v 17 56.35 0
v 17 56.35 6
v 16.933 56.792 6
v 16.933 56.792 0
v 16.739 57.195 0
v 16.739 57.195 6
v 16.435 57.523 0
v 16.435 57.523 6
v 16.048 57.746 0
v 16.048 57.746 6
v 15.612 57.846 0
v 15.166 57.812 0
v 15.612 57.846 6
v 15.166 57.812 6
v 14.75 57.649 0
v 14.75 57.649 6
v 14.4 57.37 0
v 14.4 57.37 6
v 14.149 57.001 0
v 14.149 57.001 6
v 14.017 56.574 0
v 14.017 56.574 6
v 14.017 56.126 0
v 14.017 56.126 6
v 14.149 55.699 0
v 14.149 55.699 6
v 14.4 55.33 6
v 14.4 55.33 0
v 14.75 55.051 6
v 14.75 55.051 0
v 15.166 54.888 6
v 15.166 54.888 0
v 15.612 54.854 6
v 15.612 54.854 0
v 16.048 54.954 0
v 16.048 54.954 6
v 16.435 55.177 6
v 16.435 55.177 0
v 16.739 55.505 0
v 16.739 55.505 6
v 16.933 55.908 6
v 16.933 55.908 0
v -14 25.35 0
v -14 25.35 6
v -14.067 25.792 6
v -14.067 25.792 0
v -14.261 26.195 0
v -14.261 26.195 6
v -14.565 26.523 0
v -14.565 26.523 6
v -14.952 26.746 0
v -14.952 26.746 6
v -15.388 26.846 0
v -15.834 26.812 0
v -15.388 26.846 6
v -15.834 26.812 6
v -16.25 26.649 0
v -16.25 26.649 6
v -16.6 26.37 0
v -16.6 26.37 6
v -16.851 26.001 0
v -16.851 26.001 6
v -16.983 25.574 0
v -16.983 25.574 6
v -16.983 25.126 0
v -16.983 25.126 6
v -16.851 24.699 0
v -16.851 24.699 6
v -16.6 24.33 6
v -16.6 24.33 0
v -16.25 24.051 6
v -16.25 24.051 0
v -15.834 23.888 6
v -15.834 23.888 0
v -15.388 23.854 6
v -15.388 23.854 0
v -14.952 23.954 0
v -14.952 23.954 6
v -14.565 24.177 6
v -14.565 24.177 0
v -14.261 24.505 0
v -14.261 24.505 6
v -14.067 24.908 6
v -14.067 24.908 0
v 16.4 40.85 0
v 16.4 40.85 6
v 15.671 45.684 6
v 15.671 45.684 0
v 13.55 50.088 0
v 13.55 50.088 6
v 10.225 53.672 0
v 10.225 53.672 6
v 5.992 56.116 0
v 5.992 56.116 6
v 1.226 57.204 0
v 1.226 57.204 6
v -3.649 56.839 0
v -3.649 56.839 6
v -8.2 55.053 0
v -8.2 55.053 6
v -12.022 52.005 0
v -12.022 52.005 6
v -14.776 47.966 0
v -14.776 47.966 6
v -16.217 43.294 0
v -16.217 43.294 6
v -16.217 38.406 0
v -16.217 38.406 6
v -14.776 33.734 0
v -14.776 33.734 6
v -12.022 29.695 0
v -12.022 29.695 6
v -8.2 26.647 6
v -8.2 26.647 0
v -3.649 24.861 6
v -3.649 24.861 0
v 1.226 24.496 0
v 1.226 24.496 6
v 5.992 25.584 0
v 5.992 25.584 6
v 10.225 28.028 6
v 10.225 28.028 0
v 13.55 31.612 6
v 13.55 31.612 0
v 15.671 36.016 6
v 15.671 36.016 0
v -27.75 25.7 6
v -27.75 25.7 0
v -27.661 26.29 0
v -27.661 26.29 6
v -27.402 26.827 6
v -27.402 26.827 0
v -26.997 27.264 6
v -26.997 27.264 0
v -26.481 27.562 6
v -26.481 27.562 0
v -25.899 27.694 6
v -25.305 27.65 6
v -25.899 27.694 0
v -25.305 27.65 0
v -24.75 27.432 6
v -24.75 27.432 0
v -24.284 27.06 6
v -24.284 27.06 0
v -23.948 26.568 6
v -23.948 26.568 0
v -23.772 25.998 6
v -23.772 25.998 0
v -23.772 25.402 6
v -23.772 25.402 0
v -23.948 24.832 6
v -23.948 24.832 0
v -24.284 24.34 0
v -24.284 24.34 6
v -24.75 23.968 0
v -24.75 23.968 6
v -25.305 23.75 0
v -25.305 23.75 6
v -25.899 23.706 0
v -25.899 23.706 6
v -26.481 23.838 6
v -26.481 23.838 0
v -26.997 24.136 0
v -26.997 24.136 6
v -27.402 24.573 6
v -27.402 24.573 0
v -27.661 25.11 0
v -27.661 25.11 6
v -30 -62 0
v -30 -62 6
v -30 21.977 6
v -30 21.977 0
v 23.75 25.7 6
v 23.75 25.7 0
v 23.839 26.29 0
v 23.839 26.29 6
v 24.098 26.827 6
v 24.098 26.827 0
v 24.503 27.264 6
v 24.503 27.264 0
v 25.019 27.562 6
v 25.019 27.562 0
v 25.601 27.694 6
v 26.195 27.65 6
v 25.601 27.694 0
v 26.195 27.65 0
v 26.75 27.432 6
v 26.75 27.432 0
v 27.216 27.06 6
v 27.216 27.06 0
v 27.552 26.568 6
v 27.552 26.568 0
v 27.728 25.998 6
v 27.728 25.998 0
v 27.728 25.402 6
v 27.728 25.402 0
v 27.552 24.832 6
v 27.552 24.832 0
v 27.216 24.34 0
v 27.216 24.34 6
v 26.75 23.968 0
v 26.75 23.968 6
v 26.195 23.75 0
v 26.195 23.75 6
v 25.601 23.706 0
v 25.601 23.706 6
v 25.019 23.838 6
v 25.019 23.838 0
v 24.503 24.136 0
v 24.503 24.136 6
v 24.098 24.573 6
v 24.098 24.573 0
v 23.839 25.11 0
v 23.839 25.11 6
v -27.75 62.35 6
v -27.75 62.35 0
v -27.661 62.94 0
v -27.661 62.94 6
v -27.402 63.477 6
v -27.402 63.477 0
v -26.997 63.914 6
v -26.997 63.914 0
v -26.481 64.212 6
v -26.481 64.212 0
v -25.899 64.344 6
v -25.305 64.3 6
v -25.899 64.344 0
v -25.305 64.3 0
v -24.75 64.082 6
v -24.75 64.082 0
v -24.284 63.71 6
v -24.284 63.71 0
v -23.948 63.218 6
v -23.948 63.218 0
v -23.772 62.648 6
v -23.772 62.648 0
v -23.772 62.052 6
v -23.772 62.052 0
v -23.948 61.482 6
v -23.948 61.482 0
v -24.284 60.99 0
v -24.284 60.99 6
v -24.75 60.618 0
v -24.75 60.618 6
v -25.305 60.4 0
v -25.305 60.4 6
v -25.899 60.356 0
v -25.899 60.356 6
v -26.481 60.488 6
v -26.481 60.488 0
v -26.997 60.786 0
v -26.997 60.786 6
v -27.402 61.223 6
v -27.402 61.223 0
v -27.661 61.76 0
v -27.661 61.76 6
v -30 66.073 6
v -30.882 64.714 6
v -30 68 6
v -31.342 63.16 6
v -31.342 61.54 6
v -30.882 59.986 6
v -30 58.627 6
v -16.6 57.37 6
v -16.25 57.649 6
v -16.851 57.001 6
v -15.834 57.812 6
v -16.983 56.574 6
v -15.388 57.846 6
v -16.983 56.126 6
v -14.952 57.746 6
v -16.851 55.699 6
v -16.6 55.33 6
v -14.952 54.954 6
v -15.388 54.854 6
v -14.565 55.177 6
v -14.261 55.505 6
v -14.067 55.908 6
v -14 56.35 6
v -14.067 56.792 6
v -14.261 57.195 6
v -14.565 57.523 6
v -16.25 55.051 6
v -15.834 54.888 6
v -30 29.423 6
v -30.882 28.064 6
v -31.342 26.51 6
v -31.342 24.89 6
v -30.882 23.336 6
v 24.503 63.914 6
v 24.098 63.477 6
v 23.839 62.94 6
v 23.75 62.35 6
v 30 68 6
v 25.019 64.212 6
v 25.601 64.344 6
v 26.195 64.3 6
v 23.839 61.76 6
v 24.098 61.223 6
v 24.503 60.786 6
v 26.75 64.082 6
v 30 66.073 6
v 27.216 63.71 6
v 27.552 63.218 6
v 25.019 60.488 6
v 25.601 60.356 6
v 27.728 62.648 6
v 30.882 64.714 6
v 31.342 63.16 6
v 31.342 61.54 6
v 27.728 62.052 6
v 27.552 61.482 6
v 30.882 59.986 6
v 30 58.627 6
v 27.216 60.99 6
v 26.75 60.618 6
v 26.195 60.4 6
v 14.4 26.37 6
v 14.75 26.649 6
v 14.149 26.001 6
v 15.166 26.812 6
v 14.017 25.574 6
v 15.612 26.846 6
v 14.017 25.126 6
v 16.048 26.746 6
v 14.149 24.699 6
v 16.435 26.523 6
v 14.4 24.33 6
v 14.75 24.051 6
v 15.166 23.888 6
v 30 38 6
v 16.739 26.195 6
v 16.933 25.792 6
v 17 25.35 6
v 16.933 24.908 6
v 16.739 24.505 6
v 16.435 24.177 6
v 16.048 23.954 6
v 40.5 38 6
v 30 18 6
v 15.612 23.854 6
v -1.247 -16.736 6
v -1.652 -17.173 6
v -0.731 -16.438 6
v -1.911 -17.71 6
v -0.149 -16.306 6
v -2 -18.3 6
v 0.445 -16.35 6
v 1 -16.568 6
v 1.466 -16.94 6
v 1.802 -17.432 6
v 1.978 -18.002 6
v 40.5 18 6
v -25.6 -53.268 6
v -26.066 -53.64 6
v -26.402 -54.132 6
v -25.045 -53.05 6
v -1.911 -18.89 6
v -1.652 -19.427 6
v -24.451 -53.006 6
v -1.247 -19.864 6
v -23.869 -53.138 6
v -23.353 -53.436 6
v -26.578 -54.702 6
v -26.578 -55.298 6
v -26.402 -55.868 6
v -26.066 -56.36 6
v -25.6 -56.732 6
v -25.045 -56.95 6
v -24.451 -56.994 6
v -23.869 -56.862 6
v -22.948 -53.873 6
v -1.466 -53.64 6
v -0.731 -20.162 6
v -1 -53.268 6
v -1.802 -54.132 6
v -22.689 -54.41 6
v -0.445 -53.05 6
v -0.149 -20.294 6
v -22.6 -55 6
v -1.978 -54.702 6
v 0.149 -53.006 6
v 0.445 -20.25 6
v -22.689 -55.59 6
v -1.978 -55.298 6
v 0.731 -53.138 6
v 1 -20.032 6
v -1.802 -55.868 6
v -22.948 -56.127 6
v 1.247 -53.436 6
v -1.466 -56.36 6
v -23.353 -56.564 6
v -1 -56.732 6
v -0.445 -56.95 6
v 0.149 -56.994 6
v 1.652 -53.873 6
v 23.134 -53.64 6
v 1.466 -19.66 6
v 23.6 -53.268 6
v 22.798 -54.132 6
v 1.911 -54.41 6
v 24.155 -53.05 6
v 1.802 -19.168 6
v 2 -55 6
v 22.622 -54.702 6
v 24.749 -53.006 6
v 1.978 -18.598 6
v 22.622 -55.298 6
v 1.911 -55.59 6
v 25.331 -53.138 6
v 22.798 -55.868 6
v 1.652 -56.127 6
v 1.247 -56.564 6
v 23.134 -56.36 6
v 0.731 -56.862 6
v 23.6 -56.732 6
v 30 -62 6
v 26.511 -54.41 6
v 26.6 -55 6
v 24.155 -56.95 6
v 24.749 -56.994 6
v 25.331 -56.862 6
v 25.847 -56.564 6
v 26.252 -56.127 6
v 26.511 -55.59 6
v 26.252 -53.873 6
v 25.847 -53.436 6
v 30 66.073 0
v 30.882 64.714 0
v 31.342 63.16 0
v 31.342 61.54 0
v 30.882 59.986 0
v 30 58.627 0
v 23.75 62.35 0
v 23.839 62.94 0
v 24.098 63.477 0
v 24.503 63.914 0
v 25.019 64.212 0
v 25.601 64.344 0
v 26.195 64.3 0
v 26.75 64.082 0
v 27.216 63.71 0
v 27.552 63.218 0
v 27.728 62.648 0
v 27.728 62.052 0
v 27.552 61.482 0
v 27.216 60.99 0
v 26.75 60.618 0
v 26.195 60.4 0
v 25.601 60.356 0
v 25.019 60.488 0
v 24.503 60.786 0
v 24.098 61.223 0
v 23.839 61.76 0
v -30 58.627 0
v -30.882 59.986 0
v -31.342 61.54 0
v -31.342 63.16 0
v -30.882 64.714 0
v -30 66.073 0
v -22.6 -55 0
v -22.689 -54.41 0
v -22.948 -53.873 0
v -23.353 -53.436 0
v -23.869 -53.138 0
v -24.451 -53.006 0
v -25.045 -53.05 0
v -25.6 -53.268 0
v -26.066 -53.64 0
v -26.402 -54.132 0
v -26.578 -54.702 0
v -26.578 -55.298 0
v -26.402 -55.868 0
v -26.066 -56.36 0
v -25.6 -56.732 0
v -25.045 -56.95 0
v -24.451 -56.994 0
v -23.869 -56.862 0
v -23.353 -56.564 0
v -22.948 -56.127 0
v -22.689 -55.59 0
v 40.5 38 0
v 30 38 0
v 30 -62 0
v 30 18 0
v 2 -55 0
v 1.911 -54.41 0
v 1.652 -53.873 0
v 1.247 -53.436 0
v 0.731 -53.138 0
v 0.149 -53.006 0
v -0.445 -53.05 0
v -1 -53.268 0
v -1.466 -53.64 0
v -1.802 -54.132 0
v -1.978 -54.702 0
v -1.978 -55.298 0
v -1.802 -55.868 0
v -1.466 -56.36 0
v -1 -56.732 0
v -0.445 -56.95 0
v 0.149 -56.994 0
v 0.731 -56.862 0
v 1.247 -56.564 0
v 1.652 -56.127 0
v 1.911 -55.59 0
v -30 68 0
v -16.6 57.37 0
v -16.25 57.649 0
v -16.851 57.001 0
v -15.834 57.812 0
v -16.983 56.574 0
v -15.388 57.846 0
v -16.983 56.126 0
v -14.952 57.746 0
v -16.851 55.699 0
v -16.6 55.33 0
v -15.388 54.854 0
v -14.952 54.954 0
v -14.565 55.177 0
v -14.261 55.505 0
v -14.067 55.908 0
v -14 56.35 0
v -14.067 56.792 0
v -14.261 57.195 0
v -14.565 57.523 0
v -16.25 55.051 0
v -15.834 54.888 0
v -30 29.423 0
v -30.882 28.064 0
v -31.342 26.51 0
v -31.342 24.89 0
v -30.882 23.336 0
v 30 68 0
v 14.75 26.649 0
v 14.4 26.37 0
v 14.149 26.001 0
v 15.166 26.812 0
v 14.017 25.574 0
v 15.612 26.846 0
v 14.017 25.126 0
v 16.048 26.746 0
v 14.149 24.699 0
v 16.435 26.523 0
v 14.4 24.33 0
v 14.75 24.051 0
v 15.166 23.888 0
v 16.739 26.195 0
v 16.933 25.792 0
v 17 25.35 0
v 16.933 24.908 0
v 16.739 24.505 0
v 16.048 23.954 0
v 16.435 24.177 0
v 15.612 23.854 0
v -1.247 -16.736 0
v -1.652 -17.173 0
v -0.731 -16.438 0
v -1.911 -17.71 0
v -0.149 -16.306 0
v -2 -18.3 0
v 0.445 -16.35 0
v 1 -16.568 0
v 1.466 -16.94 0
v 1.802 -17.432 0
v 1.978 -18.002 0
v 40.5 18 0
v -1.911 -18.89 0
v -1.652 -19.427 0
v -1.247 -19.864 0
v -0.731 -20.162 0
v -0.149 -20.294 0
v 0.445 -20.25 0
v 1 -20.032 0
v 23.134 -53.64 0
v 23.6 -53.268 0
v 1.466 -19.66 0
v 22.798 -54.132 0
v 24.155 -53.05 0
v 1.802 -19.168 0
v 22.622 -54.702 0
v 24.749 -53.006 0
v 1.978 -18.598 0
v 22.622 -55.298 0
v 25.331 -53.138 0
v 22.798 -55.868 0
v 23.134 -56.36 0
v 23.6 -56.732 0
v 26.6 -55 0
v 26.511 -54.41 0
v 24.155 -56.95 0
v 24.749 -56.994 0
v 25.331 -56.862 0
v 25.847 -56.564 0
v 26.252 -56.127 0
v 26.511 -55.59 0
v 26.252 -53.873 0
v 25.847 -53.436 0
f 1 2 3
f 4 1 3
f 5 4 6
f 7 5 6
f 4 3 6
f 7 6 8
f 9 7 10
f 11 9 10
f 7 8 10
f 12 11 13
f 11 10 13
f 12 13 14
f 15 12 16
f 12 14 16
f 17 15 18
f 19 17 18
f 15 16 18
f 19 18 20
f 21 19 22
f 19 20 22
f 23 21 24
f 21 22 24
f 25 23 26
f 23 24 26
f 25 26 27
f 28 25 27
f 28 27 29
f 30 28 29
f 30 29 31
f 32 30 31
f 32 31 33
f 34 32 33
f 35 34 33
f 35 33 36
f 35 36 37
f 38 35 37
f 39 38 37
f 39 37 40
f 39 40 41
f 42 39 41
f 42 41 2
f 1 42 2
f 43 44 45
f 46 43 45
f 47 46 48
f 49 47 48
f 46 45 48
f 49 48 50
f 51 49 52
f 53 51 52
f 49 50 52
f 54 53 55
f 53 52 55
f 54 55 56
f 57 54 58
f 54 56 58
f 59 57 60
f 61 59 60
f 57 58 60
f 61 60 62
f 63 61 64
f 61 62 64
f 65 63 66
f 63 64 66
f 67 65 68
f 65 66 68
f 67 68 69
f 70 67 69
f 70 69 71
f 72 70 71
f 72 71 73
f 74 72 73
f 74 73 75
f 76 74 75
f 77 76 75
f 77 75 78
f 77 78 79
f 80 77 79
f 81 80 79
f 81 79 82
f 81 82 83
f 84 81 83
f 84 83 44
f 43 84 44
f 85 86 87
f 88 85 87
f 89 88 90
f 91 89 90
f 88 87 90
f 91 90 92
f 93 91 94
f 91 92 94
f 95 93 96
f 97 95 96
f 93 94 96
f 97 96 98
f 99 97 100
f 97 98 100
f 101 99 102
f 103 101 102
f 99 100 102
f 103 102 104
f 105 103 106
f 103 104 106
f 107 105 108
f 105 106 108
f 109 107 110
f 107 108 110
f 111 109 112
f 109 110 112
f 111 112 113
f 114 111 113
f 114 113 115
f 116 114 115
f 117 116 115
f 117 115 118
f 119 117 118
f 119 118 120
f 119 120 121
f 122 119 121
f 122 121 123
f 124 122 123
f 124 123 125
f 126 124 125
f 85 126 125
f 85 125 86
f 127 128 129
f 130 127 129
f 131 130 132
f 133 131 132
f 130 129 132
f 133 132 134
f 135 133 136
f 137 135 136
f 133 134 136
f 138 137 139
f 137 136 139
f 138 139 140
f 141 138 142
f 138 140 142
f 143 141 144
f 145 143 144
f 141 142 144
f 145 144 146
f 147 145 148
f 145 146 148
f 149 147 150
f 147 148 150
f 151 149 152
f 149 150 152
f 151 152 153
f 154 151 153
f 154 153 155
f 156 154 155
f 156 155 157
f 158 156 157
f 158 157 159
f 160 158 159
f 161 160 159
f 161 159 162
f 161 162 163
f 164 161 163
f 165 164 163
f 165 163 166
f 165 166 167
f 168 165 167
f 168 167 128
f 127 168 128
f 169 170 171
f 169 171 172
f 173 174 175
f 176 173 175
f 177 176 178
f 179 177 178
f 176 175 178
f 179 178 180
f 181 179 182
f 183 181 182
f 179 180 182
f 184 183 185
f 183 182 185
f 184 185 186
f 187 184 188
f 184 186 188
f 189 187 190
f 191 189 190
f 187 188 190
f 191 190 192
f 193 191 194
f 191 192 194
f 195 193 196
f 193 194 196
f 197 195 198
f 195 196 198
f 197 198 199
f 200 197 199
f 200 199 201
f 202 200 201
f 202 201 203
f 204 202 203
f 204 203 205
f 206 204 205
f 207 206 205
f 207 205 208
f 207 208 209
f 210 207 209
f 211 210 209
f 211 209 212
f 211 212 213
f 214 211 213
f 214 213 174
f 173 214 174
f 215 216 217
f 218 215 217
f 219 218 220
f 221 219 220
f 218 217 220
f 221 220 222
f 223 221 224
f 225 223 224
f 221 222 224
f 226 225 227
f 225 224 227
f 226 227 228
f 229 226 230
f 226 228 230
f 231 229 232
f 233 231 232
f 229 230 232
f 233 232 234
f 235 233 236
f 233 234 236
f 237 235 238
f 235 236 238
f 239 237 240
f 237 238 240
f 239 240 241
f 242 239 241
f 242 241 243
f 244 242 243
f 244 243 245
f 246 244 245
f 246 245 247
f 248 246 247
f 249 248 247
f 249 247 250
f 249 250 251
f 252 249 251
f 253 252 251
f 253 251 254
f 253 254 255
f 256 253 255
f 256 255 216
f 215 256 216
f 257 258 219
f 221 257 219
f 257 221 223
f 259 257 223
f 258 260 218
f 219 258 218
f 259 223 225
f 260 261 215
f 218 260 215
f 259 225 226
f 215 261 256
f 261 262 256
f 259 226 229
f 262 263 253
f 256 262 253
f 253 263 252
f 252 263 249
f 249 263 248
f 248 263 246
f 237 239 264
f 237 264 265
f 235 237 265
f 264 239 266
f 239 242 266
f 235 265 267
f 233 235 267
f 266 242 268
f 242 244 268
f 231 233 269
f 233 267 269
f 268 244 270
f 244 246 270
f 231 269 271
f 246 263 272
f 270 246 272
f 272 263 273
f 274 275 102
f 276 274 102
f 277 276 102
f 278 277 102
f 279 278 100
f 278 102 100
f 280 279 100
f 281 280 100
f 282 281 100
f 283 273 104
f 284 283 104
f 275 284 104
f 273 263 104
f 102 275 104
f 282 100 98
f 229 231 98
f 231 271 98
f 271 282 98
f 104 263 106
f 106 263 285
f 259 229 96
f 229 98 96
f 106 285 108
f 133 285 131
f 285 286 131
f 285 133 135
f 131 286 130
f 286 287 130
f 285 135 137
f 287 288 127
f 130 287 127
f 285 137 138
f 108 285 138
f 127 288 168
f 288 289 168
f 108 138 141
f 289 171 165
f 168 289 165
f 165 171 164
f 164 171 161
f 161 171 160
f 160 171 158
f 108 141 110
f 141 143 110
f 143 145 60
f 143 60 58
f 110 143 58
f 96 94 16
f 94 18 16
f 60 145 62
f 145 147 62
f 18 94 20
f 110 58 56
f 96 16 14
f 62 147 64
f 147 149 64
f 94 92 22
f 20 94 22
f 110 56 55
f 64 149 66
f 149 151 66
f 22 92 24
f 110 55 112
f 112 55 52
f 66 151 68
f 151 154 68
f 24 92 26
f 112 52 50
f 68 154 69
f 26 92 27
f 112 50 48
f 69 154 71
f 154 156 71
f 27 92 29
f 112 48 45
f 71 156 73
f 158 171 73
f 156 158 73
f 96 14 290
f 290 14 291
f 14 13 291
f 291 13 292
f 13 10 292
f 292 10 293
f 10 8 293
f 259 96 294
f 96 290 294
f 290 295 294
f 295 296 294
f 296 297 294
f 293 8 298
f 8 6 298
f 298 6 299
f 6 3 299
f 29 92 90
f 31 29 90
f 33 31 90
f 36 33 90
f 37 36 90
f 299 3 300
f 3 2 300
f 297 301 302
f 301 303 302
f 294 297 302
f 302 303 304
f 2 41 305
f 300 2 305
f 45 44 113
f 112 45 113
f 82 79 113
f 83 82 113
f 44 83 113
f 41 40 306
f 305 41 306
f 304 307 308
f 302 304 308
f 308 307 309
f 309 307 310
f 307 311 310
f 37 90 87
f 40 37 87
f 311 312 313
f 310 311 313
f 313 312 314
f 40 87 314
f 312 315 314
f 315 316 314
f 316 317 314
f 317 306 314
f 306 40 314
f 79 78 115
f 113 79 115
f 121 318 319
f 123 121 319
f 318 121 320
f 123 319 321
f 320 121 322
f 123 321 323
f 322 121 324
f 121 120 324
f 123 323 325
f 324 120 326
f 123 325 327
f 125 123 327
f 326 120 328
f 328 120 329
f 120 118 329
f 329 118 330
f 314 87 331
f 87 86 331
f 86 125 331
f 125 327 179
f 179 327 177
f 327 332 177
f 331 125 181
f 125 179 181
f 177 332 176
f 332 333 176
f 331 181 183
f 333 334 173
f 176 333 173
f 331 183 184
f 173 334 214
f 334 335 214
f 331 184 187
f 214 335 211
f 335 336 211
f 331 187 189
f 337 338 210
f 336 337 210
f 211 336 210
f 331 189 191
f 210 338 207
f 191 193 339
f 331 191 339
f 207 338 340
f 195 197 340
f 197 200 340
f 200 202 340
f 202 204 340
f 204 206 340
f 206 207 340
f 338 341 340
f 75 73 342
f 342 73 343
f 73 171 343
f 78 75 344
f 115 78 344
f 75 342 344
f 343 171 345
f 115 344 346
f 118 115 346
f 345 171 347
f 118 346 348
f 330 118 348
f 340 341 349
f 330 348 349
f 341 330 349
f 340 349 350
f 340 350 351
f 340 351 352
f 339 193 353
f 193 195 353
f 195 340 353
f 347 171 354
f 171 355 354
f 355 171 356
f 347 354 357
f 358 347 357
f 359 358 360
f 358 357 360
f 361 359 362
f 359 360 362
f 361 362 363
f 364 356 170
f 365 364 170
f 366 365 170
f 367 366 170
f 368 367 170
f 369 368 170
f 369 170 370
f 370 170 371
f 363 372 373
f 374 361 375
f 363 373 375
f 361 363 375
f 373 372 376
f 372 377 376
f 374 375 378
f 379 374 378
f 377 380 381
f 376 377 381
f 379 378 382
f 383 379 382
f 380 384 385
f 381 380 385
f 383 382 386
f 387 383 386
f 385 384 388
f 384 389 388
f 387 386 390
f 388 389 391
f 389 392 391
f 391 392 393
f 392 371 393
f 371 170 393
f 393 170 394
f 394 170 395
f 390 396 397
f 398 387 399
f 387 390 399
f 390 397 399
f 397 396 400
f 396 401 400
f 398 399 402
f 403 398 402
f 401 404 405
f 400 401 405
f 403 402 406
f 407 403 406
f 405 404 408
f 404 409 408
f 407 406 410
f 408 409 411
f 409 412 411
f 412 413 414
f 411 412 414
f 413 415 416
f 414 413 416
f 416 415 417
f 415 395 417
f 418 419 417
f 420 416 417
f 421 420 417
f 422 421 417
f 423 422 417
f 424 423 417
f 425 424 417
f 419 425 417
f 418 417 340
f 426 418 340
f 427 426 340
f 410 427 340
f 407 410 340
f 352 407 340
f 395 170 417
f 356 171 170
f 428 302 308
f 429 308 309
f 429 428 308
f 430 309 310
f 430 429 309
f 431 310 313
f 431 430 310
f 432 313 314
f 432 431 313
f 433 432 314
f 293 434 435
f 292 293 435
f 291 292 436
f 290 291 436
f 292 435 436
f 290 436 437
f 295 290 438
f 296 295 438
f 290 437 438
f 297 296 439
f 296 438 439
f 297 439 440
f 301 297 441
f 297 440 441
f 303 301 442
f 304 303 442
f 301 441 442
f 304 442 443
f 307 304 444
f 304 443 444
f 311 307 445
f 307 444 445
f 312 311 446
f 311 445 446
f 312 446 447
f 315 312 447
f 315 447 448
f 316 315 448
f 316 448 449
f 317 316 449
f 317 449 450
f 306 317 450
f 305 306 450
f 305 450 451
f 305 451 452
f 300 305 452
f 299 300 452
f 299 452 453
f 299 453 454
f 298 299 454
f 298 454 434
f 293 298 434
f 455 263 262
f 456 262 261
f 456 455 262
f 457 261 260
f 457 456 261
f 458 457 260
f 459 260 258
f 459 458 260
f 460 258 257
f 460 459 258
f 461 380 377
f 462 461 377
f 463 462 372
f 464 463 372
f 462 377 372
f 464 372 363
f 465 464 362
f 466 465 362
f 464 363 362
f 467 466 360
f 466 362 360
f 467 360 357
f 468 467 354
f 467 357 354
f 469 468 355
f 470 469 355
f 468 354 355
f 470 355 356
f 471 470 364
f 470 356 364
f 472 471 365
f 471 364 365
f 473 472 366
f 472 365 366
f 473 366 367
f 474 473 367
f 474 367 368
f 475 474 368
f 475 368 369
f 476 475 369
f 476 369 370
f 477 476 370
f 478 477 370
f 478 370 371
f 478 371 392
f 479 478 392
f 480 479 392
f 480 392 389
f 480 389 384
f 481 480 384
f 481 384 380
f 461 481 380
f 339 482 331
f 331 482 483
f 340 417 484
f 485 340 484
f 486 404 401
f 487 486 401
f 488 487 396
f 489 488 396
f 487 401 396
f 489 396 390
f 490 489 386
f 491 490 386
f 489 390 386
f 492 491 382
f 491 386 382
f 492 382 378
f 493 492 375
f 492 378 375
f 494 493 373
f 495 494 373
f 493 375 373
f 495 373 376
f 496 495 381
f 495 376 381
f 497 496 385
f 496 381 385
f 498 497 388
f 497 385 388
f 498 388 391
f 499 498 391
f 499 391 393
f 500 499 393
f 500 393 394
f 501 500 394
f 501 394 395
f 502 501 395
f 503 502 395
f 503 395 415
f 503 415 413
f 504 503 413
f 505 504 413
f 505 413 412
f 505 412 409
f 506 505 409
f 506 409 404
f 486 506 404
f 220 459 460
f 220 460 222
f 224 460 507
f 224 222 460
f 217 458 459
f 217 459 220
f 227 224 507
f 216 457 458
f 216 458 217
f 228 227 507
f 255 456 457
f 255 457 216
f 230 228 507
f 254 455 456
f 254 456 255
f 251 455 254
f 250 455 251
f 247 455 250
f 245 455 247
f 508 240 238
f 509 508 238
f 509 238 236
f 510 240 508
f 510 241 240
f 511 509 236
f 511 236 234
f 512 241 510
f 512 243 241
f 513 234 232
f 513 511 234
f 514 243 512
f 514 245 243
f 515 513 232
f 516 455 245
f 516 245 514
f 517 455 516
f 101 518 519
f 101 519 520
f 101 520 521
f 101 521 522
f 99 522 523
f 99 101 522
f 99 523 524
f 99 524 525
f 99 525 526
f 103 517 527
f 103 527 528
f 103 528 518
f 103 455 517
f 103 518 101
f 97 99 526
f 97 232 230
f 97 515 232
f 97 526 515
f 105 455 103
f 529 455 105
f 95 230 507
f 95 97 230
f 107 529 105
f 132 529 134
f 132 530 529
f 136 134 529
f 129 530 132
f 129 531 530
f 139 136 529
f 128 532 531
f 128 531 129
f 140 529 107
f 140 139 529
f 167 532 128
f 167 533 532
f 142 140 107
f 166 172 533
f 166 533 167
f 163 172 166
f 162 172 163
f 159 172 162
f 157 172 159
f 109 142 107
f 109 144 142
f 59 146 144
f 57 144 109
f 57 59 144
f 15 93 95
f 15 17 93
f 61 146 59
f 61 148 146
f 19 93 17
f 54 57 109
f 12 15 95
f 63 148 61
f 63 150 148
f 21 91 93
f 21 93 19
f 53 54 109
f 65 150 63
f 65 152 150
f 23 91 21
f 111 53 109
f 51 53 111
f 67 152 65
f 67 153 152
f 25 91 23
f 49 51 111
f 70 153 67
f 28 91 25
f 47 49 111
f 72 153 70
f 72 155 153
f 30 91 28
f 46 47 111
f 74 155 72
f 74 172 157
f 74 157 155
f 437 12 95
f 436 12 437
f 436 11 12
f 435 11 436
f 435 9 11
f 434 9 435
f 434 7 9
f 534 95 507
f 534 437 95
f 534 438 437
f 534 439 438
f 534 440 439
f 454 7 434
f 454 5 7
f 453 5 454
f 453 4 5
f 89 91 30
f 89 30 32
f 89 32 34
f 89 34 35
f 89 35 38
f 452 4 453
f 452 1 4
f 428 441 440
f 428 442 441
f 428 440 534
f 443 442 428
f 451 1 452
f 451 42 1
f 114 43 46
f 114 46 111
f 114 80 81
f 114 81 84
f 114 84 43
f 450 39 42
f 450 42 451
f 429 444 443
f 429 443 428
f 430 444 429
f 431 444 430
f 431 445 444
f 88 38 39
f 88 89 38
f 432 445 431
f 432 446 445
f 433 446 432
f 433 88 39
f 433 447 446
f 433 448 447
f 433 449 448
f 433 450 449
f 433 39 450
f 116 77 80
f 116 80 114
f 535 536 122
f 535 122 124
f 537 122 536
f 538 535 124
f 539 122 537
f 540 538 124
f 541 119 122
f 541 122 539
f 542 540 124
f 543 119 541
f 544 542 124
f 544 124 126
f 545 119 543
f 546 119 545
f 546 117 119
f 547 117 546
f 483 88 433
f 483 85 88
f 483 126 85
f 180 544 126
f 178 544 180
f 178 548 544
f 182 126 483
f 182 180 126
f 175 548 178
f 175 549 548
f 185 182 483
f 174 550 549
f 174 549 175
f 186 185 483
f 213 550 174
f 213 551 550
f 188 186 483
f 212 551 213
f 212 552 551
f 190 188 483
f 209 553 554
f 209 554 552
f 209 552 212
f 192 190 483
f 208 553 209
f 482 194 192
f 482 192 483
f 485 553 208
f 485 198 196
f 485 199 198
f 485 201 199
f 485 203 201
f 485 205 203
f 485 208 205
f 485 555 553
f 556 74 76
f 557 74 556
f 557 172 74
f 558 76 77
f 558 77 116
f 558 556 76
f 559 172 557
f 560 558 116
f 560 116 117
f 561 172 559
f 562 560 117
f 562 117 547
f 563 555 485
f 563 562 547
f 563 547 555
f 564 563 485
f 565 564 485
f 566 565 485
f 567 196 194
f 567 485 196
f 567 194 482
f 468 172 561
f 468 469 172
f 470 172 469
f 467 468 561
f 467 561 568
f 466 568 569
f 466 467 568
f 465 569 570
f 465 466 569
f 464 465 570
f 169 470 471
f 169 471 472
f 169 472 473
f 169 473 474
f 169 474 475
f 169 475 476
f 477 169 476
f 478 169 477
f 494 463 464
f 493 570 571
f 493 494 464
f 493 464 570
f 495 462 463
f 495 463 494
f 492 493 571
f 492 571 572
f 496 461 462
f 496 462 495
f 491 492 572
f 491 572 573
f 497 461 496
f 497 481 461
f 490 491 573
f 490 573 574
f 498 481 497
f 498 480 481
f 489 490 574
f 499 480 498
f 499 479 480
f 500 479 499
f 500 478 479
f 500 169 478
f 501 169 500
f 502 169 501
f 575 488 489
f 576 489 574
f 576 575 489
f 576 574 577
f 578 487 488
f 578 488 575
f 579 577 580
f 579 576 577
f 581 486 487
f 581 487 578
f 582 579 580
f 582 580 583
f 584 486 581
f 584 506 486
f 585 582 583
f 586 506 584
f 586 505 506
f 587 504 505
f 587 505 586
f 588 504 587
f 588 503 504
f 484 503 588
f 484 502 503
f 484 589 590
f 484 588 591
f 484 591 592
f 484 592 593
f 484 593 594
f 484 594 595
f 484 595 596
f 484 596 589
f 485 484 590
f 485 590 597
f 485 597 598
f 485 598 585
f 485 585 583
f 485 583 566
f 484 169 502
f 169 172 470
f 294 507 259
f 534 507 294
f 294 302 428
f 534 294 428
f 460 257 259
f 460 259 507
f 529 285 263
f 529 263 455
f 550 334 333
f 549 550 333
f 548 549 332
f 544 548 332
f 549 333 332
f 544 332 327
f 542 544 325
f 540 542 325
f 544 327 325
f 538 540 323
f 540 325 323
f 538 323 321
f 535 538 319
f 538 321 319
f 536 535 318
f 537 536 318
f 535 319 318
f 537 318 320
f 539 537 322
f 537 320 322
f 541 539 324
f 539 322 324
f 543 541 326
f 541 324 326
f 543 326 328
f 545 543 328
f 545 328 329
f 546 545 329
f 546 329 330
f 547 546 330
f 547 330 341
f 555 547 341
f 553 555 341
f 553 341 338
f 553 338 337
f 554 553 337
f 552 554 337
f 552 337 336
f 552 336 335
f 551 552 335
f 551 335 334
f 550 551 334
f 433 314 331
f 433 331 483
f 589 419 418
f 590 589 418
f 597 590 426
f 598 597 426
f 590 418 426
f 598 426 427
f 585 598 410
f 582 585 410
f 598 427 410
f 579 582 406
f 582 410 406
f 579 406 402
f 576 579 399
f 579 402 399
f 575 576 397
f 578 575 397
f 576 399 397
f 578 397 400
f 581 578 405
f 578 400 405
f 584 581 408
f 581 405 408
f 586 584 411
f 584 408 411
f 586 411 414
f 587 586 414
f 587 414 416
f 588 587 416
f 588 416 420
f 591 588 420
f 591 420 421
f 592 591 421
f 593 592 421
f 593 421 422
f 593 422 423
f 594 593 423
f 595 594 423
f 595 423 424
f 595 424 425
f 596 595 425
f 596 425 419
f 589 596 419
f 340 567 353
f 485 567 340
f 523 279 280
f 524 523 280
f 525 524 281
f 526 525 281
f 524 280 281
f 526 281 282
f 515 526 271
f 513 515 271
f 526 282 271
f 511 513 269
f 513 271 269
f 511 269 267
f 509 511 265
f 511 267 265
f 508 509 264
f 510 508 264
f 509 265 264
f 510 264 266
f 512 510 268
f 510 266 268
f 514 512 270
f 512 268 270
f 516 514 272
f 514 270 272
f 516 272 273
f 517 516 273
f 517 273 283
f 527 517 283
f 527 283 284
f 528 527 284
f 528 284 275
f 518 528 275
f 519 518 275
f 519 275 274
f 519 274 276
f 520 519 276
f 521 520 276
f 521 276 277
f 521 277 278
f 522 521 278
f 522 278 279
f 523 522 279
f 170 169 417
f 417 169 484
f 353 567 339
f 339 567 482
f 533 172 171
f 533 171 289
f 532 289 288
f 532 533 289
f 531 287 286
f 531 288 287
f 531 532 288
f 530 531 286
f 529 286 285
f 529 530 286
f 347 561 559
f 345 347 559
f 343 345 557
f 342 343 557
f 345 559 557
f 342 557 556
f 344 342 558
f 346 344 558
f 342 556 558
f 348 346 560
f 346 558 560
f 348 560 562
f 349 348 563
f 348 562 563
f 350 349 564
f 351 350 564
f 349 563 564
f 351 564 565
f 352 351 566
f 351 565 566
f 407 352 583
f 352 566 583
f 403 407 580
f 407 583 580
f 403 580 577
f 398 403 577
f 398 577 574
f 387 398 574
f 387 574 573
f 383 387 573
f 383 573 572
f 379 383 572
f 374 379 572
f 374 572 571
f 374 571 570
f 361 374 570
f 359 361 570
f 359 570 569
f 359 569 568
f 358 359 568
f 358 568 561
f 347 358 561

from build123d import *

# Parameters (mm, degrees)
SKETCH_1_W          = 60
SKETCH_1_H          = 124
EXTRUDE_1_DEPTH     = 6
SKETCH_2_R          = 16.4
SKETCH_2_R_2        = 1.5
CUT_EXTRUDE_1_DEPTH = 7
SKETCH_4_R          = 2
CUT_EXTRUDE_2_DEPTH = 7
SKETCH_5_W          = 60
SKETCH_5_H          = 6
EXTRUDE_2_DEPTH     = 6
SKETCH_6_R          = 2
CUT_EXTRUDE_3_DEPTH = 7
SKETCH_7_R          = 5.65
SKETCH_7_R_2        = 2
SKETCH_7_W          = 10.5
SKETCH_7_H          = 20
EXTRUDE_3_DEPTH     = 6


with BuildPart() as part:
    # Эскиз1 → Бобышка-Вытянуть1 (new body)
    with BuildSketch(Plane.XY):
        Rectangle(SKETCH_1_W, SKETCH_1_H)
    extrude(amount=EXTRUDE_1_DEPTH)

    # Эскиз2 → Вырез-Вытянуть1 (cut, through all)
    with BuildSketch(Plane.XY.offset(6)):
        with Locations((0, 40.85)):
            Circle(SKETCH_2_R)
        with Locations((-15.5, 56.35)):
            Circle(SKETCH_2_R_2)
        with Locations((15.5, 56.35)):
            Circle(SKETCH_2_R_2)
        with Locations((15.5, 25.35)):
            Circle(SKETCH_2_R_2)
        with Locations((-15.5, 25.35)):
            Circle(SKETCH_2_R_2)
    extrude(amount=-CUT_EXTRUDE_1_DEPTH, mode=Mode.SUBTRACT)

    # Эскиз4 → Вырез-Вытянуть2 (cut, through all)
    with BuildSketch(Plane.XY.offset(6)):
        with Locations((-24.6, -55)):
            Circle(SKETCH_4_R)
        with Locations((0, -55)):
            Circle(SKETCH_4_R)
        with Locations((24.6, -55)):
            Circle(SKETCH_4_R)
    extrude(amount=-CUT_EXTRUDE_2_DEPTH, mode=Mode.SUBTRACT)

    # Эскиз5 → Бобышка-Вытянуть2 (add)
    with BuildSketch(Plane(origin=(0, 62, 0), x_dir=(1, 0, 0), z_dir=(0, 1, 0))):
        with Locations((0, -3)):
            Rectangle(SKETCH_5_W, SKETCH_5_H)
    extrude(amount=EXTRUDE_2_DEPTH)

    # Эскиз6 → Вырез-Вытянуть3 (cut, through all)
    with BuildSketch(Plane(origin=(0, 0, 0), x_dir=(-1, 0, 0), z_dir=(0, 0, -1))):
        with Locations((-25.75, 62.35)):
            Circle(SKETCH_6_R)
        with Locations((25.75, 62.35)):
            Circle(SKETCH_6_R)
        with Locations((25.75, 25.7)):
            Circle(SKETCH_6_R)
        with Locations((-25.75, 25.7)):
            Circle(SKETCH_6_R)
        with Locations((0, -18.3)):
            Circle(SKETCH_6_R)
    extrude(amount=-CUT_EXTRUDE_3_DEPTH, mode=Mode.SUBTRACT)

    # Эскиз7 → Бобышка-Вытянуть3 (add)
    with BuildSketch(Plane(origin=(0, 0, 0), x_dir=(-1, 0, 0), z_dir=(0, 0, -1))):
        with Locations((-25.75, 62.35)):
            Circle(SKETCH_7_R)
        with Locations((-25.75, 62.35)):
            Circle(SKETCH_7_R_2, mode=Mode.SUBTRACT)
        with Locations((25.75, 62.35)):
            Circle(SKETCH_7_R)
        with Locations((25.75, 62.35)):
            Circle(SKETCH_7_R_2, mode=Mode.SUBTRACT)
        with Locations((25.75, 25.7)):
            Circle(SKETCH_7_R)
        with Locations((25.75, 25.7)):
            Circle(SKETCH_7_R_2, mode=Mode.SUBTRACT)
        with Locations((-35.25, 28)):
            Rectangle(SKETCH_7_W, SKETCH_7_H)
    extrude(amount=-EXTRUDE_3_DEPTH)


solid = part.part
